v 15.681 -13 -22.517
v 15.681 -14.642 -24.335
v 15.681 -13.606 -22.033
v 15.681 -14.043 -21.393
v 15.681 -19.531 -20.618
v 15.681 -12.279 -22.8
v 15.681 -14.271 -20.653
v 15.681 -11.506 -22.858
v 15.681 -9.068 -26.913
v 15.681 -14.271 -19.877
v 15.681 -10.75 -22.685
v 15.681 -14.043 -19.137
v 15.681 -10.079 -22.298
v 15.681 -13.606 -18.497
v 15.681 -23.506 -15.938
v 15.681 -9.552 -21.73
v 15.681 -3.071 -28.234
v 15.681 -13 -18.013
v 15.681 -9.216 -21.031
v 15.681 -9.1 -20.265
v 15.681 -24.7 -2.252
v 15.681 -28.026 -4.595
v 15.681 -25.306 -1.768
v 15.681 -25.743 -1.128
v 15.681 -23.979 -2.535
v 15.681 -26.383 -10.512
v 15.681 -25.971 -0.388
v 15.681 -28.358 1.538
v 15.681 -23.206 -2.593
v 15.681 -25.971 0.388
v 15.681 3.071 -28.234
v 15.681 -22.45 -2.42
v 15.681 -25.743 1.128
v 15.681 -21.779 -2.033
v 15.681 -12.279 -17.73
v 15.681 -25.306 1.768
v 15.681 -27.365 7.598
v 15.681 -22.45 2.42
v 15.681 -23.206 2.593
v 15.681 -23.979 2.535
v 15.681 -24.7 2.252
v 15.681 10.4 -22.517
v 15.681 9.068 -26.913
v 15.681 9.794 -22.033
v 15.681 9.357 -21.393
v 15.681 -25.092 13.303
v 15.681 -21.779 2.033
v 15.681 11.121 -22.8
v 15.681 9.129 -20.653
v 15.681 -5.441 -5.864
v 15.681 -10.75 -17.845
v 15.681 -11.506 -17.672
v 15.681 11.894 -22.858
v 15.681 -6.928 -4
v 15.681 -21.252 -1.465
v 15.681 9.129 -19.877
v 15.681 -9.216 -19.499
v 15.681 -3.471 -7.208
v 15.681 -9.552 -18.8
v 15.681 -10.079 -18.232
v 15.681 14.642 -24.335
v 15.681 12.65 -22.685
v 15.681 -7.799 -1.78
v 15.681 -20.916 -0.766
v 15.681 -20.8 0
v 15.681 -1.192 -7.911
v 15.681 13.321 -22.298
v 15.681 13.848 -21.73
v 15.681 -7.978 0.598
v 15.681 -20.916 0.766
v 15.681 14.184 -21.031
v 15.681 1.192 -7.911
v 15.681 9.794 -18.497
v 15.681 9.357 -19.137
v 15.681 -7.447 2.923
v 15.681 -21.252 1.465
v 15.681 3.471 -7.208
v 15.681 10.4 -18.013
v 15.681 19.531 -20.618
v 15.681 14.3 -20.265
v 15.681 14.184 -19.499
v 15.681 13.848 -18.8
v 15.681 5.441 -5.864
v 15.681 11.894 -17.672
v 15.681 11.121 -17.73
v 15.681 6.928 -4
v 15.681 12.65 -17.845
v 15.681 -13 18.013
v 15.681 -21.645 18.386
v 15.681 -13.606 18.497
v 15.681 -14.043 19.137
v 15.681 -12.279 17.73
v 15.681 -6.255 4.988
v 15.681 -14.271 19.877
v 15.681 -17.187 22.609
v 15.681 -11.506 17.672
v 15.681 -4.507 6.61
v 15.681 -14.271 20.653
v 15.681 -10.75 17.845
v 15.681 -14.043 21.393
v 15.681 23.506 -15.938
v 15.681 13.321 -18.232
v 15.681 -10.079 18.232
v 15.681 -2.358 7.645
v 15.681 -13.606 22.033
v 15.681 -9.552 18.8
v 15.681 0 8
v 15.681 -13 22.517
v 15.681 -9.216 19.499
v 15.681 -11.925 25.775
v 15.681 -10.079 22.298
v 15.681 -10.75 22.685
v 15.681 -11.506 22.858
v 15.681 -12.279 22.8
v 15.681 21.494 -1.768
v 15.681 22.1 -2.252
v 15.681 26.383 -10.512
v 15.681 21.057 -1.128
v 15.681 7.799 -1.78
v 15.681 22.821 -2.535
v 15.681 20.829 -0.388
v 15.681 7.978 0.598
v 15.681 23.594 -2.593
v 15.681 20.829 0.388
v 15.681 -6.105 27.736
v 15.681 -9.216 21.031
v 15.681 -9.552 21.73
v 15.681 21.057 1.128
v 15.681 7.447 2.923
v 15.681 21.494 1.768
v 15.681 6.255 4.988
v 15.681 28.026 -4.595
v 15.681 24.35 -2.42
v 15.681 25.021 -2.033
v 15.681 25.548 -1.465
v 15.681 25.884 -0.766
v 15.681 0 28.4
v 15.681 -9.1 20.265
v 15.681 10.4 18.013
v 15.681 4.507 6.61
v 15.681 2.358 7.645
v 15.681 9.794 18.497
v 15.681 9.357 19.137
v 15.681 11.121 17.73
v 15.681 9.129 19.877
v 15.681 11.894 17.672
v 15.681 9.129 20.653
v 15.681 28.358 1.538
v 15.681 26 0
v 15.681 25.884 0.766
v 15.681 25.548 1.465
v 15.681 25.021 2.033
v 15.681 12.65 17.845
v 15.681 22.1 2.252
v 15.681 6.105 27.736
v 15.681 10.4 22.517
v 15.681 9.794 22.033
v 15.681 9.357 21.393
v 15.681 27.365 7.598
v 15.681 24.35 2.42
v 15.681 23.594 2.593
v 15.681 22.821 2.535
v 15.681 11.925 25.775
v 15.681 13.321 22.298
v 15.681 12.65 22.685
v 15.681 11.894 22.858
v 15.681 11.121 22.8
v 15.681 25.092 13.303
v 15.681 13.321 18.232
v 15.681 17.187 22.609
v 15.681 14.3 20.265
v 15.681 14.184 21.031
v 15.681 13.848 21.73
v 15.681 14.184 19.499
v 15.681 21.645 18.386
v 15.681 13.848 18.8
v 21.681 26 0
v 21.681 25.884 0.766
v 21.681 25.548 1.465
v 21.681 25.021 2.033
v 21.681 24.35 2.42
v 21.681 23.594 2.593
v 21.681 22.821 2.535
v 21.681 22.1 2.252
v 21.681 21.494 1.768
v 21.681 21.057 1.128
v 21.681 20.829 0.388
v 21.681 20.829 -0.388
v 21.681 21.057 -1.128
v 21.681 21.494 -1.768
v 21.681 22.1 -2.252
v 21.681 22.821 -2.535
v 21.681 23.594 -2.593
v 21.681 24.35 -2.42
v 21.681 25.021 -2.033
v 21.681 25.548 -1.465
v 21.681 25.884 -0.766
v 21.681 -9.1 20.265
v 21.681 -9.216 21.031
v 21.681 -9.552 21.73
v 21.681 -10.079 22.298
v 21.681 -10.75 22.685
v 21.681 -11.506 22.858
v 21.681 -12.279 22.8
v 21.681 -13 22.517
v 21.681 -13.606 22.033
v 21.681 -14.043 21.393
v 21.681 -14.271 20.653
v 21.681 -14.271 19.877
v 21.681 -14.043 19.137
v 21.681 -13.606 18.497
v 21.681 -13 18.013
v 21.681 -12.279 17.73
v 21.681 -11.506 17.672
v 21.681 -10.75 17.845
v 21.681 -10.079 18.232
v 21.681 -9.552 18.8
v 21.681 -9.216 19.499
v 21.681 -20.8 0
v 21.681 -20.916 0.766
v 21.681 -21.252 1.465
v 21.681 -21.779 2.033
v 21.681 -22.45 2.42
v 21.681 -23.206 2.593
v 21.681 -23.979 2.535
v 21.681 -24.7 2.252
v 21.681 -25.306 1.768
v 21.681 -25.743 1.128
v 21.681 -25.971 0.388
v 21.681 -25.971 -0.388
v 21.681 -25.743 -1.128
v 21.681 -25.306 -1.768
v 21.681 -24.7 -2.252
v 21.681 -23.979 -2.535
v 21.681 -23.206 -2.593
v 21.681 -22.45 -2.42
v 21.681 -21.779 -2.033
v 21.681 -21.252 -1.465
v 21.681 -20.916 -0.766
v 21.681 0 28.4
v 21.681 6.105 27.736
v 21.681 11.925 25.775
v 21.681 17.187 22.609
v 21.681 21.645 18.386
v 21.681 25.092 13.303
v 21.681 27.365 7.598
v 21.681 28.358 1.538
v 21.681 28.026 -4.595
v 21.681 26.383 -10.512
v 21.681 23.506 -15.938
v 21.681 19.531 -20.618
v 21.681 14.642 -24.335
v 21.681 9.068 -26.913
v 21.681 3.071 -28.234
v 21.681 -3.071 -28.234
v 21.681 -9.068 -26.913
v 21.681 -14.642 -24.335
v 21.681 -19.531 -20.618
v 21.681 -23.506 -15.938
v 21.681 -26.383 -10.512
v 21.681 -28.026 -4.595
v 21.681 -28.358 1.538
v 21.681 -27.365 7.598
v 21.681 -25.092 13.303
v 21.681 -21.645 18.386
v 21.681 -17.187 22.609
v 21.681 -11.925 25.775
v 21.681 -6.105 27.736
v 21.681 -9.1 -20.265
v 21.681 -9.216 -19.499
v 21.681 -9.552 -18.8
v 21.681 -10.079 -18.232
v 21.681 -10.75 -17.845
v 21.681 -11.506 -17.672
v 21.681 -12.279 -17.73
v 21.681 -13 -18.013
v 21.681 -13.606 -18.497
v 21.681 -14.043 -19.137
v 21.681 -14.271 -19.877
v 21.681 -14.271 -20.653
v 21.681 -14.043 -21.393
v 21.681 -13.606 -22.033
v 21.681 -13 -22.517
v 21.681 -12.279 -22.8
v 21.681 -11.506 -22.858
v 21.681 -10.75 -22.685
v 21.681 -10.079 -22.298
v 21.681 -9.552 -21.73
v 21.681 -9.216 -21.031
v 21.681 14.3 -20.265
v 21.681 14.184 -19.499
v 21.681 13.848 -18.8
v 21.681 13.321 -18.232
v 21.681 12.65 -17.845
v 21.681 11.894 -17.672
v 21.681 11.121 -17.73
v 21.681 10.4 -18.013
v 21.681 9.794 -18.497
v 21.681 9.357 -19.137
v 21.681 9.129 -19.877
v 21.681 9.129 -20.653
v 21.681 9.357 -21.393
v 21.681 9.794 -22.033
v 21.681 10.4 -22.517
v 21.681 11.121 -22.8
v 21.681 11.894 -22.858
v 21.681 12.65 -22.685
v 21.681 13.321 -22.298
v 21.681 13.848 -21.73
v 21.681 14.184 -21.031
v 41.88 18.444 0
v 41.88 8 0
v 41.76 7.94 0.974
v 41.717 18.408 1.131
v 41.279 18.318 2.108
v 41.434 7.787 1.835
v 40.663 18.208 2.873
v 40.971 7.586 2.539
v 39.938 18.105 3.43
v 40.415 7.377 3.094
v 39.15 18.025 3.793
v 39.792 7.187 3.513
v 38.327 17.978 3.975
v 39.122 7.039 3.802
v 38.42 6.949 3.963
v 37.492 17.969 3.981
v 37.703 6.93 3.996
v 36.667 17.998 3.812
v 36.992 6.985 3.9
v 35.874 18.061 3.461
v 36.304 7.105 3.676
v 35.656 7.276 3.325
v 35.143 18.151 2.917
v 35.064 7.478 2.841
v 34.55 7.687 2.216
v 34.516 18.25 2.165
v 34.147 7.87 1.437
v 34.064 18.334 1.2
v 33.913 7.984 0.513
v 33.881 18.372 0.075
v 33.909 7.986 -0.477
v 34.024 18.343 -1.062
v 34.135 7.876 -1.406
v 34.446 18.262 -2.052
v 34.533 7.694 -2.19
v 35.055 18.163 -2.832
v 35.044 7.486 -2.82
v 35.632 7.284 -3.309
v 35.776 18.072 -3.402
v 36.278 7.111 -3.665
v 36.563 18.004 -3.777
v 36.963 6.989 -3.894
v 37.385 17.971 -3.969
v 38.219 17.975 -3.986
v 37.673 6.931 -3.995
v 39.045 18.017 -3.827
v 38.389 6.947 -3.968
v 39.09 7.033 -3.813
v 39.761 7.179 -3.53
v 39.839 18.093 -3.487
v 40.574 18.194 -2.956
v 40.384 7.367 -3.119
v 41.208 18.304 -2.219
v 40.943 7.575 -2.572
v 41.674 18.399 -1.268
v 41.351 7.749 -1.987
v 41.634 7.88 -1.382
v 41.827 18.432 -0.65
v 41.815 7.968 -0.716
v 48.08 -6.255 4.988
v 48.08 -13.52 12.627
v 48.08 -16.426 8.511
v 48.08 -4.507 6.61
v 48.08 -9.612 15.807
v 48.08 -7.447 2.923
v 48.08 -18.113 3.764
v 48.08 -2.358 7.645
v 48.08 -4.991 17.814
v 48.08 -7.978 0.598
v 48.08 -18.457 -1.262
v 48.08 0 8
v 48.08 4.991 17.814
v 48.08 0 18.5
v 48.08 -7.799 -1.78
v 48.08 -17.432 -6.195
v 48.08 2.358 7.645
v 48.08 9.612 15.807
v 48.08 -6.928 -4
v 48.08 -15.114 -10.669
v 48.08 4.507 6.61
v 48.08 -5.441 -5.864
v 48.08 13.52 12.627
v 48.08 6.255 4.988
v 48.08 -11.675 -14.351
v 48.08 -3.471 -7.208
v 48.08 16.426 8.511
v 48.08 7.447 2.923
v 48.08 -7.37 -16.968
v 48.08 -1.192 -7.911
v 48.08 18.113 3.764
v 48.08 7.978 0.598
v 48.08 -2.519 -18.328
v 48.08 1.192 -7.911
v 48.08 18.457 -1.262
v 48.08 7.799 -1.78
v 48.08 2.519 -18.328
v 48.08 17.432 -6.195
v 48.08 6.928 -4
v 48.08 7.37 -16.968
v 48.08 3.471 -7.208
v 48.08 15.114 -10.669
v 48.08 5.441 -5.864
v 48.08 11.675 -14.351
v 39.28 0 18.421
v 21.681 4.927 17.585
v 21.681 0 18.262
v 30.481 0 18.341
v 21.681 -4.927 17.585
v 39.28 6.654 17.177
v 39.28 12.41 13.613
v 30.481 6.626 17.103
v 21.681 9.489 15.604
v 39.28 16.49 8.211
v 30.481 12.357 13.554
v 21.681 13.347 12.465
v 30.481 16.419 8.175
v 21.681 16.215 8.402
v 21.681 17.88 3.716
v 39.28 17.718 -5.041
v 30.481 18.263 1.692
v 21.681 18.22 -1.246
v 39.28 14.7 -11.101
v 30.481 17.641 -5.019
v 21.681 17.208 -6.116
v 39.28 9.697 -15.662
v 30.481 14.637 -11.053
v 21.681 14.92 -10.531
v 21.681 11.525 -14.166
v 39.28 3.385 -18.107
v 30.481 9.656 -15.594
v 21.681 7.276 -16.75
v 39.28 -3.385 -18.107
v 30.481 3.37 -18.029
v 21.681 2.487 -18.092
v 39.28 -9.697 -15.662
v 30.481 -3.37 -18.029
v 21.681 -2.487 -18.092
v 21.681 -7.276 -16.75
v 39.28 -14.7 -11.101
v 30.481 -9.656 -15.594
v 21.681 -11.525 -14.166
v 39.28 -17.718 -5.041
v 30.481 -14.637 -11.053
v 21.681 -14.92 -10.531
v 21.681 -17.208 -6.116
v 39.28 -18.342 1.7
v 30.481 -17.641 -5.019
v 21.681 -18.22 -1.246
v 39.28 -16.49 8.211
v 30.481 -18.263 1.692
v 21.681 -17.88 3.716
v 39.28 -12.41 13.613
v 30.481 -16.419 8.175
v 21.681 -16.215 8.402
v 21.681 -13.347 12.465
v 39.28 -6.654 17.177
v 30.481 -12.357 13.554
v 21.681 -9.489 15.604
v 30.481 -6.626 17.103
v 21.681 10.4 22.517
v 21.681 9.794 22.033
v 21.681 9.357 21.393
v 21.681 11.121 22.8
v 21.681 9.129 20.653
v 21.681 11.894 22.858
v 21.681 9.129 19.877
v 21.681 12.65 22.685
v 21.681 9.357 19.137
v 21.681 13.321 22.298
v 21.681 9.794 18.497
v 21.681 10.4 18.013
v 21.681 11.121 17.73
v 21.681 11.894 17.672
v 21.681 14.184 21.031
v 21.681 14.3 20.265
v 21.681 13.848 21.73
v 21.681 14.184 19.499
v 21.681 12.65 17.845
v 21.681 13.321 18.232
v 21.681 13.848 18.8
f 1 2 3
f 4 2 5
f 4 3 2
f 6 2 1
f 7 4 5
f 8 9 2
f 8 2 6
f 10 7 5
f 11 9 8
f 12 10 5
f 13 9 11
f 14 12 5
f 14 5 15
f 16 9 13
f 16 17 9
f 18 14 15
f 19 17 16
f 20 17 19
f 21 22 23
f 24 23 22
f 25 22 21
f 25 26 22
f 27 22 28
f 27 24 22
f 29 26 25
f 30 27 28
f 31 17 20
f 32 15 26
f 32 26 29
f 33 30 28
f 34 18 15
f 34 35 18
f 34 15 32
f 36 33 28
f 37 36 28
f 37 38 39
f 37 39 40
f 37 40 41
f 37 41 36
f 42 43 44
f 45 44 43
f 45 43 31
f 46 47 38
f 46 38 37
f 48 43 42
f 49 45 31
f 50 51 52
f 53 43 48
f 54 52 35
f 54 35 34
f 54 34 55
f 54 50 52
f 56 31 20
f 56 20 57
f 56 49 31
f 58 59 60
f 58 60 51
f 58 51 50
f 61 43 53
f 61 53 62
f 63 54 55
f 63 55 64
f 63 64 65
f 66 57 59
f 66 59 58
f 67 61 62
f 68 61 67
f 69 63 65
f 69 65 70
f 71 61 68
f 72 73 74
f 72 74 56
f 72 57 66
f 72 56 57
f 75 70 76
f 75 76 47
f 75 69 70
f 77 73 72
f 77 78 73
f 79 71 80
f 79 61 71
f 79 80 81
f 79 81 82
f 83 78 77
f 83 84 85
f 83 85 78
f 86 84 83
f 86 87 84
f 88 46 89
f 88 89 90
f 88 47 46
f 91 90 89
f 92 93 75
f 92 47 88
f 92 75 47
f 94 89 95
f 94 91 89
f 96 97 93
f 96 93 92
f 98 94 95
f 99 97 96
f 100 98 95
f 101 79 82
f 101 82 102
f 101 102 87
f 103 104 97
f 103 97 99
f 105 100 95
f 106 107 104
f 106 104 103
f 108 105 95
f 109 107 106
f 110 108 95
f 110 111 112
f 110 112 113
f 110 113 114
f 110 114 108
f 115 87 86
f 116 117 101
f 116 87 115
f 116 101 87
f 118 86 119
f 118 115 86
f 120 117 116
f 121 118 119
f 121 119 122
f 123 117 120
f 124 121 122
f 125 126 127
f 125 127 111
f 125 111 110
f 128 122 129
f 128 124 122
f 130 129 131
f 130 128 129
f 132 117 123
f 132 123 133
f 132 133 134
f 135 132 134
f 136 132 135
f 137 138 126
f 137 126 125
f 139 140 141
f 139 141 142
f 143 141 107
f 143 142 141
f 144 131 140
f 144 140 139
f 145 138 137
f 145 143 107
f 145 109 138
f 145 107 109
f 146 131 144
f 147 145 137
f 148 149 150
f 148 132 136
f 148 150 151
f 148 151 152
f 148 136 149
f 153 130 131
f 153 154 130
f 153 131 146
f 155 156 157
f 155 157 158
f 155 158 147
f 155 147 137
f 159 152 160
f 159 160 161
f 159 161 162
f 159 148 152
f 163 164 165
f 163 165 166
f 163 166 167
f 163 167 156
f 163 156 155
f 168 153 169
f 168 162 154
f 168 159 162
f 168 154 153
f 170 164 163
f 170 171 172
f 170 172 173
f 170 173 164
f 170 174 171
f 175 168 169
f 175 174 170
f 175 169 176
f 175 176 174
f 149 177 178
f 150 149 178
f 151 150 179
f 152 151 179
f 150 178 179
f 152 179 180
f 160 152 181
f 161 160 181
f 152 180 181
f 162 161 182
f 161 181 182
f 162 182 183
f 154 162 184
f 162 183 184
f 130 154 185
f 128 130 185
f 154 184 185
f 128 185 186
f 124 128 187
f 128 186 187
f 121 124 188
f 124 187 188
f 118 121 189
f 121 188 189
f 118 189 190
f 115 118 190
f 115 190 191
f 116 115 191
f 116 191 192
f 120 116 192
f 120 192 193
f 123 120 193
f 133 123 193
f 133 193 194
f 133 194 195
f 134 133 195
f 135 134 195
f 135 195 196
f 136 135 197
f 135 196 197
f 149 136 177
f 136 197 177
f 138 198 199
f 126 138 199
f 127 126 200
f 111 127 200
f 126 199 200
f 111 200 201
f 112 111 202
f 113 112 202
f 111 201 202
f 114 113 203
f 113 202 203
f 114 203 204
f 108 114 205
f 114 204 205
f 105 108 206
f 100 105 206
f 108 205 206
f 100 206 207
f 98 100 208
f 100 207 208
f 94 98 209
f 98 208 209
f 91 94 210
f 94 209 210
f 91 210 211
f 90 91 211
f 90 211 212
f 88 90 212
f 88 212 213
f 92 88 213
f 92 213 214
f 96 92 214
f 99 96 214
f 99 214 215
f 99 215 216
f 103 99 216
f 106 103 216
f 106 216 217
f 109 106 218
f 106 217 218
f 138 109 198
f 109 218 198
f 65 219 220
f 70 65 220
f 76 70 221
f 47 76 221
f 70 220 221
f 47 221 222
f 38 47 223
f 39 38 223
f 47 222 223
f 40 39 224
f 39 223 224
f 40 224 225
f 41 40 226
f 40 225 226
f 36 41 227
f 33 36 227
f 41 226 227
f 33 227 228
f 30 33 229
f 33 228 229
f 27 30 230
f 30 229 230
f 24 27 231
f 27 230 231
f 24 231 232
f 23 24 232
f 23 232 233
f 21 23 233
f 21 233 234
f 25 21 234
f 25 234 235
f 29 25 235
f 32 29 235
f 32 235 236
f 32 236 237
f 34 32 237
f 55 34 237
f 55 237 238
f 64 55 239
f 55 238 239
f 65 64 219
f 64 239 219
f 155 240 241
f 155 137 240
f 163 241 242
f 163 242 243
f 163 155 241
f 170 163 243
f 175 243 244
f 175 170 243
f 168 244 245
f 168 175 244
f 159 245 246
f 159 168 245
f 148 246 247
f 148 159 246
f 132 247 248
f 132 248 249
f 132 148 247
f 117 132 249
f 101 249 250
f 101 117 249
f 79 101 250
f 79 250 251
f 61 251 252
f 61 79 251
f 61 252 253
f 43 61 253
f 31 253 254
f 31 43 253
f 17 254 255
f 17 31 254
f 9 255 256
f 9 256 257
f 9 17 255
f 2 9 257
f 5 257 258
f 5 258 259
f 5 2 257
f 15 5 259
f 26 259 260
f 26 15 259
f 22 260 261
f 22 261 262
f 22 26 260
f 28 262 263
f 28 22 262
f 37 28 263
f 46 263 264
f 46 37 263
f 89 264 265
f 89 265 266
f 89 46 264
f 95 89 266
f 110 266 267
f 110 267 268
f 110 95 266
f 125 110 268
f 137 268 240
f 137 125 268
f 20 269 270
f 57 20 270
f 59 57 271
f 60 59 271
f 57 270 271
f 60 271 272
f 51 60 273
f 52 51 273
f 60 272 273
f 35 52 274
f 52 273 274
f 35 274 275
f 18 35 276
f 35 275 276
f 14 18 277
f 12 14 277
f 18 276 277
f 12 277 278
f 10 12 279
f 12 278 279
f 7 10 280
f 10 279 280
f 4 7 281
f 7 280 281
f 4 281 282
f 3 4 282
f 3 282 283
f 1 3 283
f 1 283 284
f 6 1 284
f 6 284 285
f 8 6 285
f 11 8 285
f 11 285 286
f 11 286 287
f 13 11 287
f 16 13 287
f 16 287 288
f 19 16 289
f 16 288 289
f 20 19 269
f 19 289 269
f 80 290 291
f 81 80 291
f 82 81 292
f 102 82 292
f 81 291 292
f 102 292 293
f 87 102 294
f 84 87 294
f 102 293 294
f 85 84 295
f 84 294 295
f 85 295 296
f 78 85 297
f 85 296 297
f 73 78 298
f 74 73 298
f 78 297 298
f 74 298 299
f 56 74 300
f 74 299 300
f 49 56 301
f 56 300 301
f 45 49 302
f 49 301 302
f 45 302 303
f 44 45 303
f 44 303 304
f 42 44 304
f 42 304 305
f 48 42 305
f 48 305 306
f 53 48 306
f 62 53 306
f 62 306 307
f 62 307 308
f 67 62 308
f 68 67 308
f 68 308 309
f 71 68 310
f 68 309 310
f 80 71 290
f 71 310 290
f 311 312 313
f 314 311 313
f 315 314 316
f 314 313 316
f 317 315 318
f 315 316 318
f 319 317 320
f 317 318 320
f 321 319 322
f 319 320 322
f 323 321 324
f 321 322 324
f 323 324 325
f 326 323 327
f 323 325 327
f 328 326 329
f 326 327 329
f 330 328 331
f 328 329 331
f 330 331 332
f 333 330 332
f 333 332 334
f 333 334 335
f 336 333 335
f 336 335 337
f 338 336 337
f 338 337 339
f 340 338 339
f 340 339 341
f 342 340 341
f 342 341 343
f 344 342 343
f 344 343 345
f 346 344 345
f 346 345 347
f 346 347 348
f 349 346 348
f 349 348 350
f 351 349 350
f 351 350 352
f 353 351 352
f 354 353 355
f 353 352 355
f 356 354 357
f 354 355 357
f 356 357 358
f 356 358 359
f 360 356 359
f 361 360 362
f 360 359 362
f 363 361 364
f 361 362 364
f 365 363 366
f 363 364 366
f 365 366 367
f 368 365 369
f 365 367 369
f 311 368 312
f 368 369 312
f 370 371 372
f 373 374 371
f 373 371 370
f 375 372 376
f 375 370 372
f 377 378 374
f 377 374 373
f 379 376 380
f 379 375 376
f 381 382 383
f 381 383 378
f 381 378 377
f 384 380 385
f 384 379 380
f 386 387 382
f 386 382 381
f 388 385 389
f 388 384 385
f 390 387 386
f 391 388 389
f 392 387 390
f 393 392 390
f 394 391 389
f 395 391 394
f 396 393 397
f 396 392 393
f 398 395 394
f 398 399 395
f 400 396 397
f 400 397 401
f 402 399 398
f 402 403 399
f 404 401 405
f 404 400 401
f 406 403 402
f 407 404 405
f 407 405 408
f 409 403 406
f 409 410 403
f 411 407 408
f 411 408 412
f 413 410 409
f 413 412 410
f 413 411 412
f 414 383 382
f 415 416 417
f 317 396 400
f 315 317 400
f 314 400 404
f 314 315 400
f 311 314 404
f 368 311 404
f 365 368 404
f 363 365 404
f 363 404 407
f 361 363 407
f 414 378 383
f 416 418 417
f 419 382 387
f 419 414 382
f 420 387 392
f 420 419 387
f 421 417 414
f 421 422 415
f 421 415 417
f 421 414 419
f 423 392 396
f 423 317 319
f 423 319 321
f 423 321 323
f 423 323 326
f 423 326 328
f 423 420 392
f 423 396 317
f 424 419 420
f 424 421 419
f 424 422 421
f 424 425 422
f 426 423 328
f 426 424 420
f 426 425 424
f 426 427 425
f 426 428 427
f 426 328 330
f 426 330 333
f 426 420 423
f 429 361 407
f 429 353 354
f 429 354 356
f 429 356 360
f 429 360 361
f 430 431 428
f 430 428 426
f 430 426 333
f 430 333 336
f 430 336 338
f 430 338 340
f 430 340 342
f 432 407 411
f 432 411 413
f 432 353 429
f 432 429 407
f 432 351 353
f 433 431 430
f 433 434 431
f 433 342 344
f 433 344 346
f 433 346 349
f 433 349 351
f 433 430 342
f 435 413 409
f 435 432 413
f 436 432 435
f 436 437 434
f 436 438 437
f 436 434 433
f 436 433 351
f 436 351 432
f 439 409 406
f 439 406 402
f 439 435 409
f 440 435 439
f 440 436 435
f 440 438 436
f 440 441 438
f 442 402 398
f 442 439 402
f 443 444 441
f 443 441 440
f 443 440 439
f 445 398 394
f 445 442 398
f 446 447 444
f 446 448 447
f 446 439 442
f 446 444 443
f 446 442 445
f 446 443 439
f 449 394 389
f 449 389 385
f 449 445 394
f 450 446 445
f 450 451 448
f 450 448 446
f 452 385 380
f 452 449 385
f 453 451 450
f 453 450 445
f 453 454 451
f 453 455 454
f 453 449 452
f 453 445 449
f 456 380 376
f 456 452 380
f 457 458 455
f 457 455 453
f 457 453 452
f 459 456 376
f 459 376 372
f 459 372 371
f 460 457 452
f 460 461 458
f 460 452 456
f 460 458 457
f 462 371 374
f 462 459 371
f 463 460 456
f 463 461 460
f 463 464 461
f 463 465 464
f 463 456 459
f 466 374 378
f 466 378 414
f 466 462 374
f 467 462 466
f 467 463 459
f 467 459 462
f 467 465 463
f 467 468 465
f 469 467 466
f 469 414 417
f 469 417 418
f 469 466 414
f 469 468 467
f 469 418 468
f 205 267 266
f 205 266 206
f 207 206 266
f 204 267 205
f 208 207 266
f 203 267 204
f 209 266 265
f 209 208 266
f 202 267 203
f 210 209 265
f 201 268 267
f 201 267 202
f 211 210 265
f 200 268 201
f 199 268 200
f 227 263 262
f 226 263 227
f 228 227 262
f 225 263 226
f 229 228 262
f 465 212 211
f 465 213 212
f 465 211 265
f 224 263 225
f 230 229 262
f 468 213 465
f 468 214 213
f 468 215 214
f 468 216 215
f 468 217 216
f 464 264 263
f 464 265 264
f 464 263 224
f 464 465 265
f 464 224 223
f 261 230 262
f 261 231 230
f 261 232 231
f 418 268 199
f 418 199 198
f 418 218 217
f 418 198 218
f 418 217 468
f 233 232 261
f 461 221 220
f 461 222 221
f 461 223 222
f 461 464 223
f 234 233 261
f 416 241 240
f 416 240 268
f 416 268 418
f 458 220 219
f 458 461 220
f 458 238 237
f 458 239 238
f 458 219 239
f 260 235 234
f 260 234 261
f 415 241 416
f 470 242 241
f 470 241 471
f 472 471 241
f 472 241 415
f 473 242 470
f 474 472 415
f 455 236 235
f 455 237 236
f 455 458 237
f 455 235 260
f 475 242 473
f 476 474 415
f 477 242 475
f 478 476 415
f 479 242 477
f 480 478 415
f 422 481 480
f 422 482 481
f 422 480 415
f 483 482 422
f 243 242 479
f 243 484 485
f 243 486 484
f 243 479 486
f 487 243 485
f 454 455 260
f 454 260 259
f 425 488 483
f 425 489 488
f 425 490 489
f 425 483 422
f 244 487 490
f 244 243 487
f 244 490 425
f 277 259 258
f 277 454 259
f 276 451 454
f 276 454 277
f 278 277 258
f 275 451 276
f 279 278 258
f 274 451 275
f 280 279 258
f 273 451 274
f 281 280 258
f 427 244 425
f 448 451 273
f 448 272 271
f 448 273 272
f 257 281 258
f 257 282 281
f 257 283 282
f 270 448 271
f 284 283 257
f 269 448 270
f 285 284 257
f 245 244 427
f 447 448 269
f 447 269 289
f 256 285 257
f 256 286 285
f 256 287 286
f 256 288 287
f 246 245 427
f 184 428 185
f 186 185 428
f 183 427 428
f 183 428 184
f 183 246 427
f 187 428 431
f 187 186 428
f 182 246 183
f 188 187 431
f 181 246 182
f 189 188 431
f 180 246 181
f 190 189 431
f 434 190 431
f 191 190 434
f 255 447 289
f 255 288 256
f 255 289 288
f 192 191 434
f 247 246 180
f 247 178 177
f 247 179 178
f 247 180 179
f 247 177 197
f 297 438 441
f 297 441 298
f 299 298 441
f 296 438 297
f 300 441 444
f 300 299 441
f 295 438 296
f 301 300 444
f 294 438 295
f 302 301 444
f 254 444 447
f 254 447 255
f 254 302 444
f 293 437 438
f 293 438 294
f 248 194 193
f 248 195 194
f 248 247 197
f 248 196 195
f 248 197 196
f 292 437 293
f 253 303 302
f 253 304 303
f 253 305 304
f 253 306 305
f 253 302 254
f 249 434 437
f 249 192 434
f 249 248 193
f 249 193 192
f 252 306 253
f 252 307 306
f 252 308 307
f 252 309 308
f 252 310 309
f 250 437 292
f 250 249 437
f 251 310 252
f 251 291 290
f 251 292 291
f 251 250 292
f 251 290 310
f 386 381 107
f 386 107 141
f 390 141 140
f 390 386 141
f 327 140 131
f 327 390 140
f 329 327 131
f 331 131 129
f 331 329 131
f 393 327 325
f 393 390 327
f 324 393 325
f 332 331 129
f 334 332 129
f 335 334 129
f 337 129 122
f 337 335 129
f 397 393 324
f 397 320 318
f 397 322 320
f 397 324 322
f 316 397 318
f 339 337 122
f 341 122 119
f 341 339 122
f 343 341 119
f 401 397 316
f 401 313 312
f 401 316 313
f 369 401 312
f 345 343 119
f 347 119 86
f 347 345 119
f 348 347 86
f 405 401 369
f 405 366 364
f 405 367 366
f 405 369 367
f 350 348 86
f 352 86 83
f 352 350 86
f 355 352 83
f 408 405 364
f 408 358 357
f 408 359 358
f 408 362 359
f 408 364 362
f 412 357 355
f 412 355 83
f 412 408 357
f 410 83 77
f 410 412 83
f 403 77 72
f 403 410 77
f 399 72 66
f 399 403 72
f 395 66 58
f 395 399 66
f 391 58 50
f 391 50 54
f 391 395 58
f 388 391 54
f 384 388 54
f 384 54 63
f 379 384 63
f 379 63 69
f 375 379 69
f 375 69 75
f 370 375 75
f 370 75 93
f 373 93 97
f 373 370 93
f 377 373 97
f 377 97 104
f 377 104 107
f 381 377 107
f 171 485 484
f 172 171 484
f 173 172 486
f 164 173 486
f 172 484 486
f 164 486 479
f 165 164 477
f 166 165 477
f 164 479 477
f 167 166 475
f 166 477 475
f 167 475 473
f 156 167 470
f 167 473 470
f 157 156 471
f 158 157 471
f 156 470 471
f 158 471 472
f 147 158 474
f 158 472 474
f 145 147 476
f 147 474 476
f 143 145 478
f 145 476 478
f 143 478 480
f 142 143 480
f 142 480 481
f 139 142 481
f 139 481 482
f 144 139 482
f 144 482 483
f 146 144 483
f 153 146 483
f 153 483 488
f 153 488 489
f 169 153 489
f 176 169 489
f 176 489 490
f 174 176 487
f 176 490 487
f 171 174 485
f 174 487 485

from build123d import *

# Parameters (mm, degrees)
F2_R     = 2.6
F3_DEPTH = 6
F4_R     = 4
F5_DEPTH = 28.401


with BuildPart() as f1:
    # F0 (on Front) → F1 (revolve)
    with BuildSketch(Plane.XZ):
        Polygon((48.080009, 8), (48.080009, 18.5), (21.681081, 18.262167), (21.681081, 28.4), (15.681081, 28.4), (15.681081, 8), align=None)
    revolve(axis=Axis((22.226226, 0, 0), (-1, 0, 0)))

    # F2 (on face) → F3 (cut)
    with BuildSketch(Plane.YZ.offset(21.681081)):
        with Locations((-23.400001, 0)):
            Circle(F2_R)
        with Locations((-11.7, -20.264995)):
            Circle(F2_R)
        with Locations((11.7, -20.264995)):
            Circle(F2_R)
        with Locations((23.400001, 0)):
            Circle(F2_R)
        with Locations((11.7, 20.264995)):
            Circle(F2_R)
        with Locations((-11.7, 20.264995)):
            Circle(F2_R)
    extrude(amount=-F3_DEPTH, mode=Mode.SUBTRACT)

    # F4 (on Front) → F5 (cut, through all)
    with BuildSketch(Plane.XZ):
        with Locations((37.880009, 0)):
            Circle(F4_R)
    extrude(amount=-F5_DEPTH, mode=Mode.SUBTRACT)


solid = f1.part
